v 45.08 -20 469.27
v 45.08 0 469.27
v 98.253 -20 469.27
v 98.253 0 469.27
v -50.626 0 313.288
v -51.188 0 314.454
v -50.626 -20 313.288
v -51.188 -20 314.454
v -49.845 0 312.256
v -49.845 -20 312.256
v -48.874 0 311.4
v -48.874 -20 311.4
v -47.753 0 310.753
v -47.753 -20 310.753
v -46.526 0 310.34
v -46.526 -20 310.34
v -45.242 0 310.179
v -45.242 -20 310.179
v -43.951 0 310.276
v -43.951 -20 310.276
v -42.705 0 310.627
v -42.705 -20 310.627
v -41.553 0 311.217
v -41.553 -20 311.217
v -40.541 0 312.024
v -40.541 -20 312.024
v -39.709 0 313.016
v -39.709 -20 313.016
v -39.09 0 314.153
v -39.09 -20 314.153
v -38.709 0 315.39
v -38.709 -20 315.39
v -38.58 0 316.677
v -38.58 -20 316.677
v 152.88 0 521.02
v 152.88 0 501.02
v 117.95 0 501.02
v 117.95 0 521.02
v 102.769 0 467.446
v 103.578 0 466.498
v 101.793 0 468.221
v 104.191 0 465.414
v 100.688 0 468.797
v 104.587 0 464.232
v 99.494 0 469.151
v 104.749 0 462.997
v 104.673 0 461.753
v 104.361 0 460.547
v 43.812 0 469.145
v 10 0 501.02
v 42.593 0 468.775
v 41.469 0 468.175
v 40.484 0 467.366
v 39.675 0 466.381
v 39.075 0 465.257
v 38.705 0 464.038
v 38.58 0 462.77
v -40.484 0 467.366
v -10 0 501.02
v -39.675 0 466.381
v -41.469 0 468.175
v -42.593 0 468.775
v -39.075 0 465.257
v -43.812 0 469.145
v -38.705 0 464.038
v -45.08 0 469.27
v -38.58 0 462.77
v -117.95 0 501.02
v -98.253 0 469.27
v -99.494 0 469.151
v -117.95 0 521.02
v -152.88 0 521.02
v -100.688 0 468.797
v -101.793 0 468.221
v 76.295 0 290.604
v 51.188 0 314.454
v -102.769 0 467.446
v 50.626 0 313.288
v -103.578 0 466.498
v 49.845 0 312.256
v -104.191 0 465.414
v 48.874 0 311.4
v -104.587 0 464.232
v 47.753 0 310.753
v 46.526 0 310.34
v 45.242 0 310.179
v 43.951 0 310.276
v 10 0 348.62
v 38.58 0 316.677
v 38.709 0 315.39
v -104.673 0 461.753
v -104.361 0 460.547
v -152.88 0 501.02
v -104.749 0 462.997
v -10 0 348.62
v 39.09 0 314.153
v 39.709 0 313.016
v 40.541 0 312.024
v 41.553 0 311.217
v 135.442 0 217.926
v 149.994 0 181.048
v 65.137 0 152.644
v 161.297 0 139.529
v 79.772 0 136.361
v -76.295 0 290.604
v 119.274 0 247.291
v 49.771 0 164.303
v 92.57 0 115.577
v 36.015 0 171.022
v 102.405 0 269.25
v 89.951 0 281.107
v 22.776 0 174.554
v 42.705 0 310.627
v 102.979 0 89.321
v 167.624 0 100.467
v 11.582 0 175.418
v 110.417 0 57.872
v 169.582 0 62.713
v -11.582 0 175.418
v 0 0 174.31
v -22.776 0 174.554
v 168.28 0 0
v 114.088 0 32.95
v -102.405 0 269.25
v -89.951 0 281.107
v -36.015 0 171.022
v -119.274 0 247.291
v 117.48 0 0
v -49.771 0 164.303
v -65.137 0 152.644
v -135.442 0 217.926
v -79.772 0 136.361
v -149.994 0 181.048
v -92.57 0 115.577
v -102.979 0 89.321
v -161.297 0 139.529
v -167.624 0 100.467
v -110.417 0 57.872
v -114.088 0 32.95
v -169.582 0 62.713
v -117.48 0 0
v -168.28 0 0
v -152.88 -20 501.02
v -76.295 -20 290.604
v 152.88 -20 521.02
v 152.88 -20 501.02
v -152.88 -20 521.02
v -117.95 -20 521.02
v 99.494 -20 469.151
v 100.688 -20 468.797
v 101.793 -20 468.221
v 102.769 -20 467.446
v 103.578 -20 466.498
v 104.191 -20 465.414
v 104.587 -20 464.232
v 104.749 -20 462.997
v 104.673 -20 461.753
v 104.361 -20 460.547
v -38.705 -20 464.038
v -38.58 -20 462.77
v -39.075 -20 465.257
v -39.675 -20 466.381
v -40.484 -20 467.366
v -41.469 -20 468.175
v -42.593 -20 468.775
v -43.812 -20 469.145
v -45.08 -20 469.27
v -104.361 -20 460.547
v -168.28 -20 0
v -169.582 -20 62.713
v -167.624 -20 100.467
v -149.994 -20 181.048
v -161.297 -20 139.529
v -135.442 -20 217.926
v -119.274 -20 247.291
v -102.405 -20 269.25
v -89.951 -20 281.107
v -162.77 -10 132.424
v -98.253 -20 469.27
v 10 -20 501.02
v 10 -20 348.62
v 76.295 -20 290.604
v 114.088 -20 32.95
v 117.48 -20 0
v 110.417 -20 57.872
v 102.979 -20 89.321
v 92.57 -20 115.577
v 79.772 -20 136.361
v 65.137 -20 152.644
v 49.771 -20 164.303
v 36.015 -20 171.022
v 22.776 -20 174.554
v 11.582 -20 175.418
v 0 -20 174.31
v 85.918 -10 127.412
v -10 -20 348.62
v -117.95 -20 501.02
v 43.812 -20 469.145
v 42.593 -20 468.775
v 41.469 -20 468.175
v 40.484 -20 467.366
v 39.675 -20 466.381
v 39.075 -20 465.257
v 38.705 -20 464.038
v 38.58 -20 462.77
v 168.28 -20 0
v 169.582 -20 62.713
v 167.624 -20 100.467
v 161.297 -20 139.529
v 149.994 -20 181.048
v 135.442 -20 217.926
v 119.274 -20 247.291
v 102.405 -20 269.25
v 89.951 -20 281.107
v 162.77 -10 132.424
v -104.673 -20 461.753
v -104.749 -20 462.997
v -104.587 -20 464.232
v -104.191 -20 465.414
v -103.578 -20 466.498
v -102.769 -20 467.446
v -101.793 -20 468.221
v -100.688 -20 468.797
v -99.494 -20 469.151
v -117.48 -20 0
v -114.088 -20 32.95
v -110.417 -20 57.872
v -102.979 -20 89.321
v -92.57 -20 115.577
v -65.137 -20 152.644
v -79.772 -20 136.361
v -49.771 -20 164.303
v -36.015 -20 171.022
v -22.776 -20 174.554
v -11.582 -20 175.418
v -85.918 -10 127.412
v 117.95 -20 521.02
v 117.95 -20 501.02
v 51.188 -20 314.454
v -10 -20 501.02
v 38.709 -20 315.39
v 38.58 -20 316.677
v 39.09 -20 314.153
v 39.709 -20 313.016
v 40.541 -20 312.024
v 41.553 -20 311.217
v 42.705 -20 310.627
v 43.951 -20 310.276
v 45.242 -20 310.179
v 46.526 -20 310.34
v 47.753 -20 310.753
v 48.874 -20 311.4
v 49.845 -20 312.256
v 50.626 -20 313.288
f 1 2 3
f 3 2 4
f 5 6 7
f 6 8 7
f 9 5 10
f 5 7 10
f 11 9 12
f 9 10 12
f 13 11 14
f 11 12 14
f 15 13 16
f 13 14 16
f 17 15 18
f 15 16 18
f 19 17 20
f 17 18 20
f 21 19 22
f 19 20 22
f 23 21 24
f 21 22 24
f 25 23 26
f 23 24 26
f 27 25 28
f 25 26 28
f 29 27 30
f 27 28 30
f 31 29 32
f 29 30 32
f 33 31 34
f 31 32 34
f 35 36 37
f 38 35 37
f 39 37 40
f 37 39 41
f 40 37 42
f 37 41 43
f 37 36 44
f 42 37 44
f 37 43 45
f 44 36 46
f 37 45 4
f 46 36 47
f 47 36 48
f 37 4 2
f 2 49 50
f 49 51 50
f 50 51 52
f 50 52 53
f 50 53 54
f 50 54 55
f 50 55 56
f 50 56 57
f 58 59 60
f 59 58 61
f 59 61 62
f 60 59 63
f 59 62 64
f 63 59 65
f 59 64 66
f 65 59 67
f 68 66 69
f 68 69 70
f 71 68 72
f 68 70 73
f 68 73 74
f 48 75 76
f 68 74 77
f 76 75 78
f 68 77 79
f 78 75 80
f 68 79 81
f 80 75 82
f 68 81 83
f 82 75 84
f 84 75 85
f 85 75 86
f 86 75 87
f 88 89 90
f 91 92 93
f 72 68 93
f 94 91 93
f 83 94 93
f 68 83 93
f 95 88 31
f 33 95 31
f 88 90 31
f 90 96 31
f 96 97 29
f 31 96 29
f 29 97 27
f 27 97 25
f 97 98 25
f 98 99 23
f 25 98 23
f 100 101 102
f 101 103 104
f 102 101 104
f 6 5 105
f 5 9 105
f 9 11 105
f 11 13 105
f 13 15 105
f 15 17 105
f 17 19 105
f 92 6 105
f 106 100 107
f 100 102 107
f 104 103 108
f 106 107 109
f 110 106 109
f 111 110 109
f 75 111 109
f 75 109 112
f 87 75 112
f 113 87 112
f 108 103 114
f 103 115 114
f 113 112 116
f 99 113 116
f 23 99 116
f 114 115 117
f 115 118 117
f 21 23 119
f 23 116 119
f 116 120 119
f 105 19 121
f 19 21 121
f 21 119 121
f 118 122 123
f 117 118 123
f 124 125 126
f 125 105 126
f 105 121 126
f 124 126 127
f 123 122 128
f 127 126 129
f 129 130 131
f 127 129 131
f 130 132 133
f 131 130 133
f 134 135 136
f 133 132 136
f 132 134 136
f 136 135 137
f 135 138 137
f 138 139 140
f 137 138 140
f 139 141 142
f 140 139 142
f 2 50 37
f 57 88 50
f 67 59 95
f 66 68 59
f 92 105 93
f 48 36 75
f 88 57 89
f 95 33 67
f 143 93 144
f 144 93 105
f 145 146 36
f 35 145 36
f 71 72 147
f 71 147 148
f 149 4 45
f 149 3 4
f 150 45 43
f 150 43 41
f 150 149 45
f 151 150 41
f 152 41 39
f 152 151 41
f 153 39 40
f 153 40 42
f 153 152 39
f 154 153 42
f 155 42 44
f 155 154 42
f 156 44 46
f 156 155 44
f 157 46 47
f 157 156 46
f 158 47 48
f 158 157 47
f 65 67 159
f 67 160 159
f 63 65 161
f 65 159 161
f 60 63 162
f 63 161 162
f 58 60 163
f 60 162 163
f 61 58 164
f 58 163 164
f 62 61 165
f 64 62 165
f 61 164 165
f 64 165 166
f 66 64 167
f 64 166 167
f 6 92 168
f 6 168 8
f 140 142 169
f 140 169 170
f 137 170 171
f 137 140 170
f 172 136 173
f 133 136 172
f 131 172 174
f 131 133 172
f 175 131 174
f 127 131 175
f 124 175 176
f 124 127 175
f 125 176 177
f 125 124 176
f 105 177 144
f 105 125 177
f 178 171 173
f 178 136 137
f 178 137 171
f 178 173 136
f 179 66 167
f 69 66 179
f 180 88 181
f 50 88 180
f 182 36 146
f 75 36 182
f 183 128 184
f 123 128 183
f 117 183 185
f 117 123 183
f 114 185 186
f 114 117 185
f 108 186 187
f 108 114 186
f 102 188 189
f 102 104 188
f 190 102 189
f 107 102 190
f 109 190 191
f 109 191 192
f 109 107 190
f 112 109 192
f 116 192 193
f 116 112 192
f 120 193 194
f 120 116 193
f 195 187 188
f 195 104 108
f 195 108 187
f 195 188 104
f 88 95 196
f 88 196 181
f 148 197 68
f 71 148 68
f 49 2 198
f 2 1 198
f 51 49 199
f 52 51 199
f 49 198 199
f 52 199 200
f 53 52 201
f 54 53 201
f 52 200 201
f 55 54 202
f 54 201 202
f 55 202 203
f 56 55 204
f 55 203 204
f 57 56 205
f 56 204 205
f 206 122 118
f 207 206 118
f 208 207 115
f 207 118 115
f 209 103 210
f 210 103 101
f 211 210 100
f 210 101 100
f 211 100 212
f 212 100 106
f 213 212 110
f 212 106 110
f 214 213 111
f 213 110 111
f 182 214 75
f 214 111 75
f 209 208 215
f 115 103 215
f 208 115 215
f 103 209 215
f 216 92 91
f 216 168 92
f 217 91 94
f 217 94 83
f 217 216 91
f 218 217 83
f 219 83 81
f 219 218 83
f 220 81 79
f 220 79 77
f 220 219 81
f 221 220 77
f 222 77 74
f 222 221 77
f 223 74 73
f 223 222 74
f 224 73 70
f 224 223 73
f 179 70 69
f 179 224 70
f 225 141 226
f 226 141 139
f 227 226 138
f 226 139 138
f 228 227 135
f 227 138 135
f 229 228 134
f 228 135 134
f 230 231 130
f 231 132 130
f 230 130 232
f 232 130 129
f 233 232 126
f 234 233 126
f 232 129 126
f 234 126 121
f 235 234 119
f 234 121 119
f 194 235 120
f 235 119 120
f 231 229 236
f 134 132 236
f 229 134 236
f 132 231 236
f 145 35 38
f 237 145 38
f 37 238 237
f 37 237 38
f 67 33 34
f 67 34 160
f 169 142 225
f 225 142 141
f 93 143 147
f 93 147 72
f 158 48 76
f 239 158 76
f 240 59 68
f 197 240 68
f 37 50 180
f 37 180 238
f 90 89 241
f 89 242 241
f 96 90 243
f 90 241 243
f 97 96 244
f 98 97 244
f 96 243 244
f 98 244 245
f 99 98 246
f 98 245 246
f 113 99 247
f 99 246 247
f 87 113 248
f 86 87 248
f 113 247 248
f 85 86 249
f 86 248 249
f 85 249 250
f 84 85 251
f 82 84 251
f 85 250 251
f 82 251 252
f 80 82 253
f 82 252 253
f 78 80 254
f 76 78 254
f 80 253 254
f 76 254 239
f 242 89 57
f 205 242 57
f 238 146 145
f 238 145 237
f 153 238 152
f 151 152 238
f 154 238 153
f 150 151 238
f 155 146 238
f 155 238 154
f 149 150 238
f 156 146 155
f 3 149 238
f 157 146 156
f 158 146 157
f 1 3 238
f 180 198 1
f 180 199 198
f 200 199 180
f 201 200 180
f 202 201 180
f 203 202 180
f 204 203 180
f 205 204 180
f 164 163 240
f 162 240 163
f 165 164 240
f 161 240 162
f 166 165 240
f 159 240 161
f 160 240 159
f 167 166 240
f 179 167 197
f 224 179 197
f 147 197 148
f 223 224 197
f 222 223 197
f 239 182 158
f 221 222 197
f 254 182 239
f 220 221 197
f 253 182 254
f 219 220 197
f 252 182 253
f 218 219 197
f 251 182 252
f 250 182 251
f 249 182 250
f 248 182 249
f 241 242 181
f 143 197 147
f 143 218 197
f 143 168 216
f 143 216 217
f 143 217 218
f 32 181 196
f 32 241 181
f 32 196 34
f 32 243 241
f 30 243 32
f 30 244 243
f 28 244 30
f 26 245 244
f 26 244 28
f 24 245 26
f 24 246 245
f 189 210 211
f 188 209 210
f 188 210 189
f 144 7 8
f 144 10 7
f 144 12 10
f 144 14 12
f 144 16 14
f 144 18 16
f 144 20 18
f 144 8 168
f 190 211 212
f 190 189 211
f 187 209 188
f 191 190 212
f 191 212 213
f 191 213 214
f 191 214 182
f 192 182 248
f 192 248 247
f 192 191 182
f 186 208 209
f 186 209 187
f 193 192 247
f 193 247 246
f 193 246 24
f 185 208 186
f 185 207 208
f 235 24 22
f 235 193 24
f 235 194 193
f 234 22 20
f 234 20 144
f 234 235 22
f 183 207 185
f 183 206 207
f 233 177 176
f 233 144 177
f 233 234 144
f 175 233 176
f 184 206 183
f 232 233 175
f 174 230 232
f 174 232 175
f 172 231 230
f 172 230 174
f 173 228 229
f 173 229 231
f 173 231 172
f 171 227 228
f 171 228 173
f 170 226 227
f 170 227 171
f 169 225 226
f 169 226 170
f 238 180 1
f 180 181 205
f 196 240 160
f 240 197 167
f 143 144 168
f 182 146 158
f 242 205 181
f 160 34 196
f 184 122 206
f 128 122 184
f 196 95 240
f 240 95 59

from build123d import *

# Parameters (mm, degrees)
F1_DEPTH = 20
F3_DEPTH = 25
F4_W     = 34.93
F4_H     = 20
F5_DEPTH = 20
F7_R     = 6.5


with BuildPart() as f1:
    # F0 (on Front) → F1 (new body)
    with BuildSketch(Plane.XZ):
        with BuildLine():
            Line((-10, 348.62), (-10, 501.02))
            Line((-10, 501.02), (-152.88, 501.02))
            Line((-152.88, 501.02), (-76.2948495065, 290.6040283536))
            add(Edge.make_bspline(
                [(-168.28, 0), (-169.5612237815, 52.4820648973), (-175.1232380622, 123.1405186652), (-124.7166168032, 262.8128105239), (-76.2948495065, 290.6040283536)],
                knots=[0, 0, 0, 0, 0.4616253265, 1, 1, 1, 1], degree=3))
            Line((-168.28, 0), (-117.48, 0))
            add(Edge.make_bspline(
                [(-117.48, 0), (-113.0349605269, 49.0087788879), (-103.2300113011, 130.3097354433), (-35.7976257801, 180.8740645647), (0, 174.31)],
                knots=[0, 0, 0, 0, 0.5366116544, 1, 1, 1, 1], degree=3))
            Line((0, 174.31), (0, 348.62))
            Line((0, 348.62), (-10, 348.62))
        make_face()
    extrude(amount=F1_DEPTH)

    # F2 (on face) → F3 (cut)
    with BuildSketch(Plane.XZ):
        Polygon((-38.58, 279.8141206615), (-38.58, 469.27), (-107.5363007859, 469.27), align=None)
    extrude(amount=F3_DEPTH, mode=Mode.SUBTRACT)

    # F4 (on face) → F5 (join)
    with BuildSketch(Plane.XY.offset(501.02)):
        with Locations((-135.415, -10)):
            Rectangle(F4_W, F4_H)
    extrude(amount=F5_DEPTH)

    # F6: F1 across plane


with BuildPart() as f1_1:
    add(f1.part)
    add(f1.part.mirror(Plane.YZ))

    # F7
    f7_edges = [f1_1.edges().sort_by_distance(p)[0] for p in [
        (-107.536301, -10, 469.27),
        (-38.58, -10, 469.27),
        (-38.58, -10, 279.814121),
        (38.58, -10, 279.814121),
        (38.58, -10, 469.27),
        (107.536301, -10, 469.27),
    ]]
    fillet(f7_edges, radius=F7_R)


solid = f1_1.part
